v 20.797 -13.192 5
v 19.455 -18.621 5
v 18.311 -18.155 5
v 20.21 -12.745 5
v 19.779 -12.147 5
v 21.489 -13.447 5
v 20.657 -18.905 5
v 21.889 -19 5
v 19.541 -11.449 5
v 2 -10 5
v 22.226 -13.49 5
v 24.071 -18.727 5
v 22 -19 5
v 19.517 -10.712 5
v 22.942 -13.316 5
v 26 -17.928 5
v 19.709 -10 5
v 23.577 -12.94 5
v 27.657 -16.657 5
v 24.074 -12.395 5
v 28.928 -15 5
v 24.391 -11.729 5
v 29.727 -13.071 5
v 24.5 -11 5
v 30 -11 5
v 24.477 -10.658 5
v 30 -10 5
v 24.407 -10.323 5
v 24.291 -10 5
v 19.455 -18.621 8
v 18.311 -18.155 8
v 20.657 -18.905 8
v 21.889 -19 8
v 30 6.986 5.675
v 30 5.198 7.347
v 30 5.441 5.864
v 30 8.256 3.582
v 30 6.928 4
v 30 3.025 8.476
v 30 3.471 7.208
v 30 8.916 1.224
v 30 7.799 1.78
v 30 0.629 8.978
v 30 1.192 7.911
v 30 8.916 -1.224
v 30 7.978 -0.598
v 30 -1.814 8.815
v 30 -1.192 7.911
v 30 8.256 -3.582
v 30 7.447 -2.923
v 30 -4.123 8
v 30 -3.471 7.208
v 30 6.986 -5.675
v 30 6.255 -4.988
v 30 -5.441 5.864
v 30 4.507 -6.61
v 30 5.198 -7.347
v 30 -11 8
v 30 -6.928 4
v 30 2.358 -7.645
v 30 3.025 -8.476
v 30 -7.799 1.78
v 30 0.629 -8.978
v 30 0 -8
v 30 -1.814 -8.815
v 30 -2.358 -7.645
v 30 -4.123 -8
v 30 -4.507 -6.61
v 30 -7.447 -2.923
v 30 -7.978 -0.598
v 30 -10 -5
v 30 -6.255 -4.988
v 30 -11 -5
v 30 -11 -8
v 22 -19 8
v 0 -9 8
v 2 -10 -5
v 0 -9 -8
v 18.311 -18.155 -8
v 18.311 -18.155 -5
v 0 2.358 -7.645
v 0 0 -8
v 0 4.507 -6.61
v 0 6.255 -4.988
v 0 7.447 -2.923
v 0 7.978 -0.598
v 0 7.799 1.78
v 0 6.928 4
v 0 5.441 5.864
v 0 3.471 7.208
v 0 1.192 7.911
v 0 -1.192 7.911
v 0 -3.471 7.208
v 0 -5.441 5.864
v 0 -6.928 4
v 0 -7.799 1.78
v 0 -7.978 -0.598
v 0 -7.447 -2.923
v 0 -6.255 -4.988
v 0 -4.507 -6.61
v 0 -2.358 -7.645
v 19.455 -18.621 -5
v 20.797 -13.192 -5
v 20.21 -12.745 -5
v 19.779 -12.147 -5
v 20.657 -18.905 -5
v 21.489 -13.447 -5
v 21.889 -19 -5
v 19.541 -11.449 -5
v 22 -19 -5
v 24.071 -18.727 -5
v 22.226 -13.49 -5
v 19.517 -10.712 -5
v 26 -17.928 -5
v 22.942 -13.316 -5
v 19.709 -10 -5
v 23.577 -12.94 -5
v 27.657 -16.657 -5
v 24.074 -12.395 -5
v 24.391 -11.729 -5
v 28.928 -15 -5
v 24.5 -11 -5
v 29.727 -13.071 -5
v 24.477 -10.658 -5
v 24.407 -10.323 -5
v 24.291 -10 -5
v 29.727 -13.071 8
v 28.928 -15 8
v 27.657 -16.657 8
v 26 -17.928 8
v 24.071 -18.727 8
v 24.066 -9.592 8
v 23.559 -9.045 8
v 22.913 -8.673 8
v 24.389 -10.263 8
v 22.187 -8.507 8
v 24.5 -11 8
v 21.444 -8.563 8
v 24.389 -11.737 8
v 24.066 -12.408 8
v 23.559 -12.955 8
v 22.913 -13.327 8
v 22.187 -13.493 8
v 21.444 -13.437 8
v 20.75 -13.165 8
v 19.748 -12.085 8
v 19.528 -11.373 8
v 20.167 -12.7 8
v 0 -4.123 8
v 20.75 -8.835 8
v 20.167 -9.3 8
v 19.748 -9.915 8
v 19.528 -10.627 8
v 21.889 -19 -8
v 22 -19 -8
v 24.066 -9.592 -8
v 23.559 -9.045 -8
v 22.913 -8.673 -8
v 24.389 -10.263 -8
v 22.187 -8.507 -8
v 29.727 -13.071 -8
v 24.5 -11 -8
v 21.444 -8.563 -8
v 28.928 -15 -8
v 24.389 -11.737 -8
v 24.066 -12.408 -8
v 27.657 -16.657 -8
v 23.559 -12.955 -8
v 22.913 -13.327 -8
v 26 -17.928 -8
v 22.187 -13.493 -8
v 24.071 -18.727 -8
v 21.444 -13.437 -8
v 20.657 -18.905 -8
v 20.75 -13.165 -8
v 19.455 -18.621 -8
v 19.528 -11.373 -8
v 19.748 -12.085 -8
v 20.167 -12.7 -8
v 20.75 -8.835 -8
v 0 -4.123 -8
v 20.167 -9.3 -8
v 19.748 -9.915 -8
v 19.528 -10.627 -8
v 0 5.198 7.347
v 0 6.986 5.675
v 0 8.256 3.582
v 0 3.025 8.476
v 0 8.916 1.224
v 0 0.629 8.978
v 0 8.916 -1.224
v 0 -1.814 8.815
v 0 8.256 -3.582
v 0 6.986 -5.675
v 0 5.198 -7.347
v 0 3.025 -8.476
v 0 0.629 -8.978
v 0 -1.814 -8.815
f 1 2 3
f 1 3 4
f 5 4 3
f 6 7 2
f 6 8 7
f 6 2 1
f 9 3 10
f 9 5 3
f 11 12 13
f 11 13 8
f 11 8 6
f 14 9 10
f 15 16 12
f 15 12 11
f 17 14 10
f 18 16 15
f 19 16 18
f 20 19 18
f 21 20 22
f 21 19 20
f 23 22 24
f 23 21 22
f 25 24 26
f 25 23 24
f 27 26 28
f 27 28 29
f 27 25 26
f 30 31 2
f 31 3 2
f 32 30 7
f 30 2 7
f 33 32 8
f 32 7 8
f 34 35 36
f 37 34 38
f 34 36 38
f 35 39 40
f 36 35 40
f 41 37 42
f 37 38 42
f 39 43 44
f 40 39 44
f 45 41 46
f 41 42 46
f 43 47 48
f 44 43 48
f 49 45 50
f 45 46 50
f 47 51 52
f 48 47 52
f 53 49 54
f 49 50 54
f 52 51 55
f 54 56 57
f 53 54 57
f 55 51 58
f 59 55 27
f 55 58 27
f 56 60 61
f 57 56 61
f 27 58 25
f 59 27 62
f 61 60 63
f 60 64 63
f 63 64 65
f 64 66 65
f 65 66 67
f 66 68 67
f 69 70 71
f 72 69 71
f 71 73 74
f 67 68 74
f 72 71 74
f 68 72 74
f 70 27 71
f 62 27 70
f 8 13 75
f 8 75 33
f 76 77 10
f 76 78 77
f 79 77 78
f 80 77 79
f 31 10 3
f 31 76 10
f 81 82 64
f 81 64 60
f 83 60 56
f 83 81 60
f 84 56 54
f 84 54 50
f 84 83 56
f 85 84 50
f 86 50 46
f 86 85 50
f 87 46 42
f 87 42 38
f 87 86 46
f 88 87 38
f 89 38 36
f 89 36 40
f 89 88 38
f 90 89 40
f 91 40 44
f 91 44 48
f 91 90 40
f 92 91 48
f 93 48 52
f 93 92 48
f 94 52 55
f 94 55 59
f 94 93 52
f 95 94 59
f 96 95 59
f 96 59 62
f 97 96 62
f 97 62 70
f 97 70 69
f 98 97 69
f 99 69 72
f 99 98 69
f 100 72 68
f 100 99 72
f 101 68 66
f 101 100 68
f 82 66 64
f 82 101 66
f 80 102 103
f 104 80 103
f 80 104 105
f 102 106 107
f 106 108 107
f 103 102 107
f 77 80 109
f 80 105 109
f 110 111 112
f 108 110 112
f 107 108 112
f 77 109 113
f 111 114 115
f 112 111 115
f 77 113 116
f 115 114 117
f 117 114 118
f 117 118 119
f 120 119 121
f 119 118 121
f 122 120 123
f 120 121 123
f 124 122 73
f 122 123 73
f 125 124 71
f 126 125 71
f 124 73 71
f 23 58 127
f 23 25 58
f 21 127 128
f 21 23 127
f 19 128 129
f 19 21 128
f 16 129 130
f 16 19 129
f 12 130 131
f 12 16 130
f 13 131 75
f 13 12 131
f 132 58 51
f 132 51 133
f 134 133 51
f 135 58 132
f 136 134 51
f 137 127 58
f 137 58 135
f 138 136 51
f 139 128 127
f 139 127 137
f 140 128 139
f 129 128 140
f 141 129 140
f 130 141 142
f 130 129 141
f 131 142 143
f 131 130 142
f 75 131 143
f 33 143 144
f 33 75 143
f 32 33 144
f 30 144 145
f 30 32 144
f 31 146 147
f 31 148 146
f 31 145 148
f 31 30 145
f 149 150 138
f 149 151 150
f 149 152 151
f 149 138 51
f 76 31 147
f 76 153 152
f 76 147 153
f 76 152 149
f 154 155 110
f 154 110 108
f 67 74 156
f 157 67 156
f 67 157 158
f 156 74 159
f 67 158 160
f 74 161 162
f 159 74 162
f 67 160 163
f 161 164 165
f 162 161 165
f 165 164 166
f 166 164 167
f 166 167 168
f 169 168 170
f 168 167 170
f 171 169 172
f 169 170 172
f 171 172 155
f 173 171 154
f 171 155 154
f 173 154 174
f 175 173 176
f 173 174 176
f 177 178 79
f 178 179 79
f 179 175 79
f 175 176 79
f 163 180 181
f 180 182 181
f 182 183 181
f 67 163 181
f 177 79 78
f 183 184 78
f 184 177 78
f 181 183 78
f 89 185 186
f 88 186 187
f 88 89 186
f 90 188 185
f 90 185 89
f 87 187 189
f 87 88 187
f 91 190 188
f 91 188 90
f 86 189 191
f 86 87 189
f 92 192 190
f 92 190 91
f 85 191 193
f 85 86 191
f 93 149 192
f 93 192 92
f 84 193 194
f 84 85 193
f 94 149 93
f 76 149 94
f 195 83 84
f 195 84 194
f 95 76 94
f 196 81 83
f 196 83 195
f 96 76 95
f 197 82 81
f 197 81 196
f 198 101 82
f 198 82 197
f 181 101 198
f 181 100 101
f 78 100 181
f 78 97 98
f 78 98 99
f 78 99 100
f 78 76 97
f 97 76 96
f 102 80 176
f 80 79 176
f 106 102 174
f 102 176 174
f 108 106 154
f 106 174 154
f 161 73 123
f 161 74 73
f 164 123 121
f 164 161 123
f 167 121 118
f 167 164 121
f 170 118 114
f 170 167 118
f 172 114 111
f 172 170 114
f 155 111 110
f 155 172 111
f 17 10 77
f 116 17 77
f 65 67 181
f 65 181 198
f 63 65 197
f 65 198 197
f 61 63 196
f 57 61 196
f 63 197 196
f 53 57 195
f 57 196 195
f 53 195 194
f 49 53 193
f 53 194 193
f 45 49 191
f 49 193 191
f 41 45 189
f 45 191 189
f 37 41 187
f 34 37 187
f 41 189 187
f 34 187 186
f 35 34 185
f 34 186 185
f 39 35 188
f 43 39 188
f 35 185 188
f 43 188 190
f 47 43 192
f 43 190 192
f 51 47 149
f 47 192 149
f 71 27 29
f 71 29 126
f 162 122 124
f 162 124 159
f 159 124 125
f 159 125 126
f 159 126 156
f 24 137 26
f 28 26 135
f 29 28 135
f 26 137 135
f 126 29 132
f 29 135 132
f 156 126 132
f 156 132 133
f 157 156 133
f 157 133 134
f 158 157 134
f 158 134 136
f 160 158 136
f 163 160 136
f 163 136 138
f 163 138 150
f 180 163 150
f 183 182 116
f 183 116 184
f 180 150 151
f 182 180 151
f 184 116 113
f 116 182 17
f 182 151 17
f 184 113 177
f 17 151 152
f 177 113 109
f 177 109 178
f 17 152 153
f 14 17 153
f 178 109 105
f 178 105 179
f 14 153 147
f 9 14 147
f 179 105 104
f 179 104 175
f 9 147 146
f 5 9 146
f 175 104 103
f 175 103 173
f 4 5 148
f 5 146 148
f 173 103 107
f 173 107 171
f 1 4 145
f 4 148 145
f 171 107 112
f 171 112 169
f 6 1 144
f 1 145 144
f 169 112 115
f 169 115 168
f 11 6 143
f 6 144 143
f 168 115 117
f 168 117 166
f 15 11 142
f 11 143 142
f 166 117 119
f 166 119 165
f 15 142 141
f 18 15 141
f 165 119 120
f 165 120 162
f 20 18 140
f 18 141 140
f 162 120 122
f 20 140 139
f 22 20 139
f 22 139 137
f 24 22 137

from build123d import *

# Parameters (mm, degrees)
SKETCH1_R                       = 9
SKETCH1_R_2                     = 8
BOSS_EXTRUDE1_DEPTH             = 30
SKETCH2_W                       = 30
SKETCH2_H                       = 16
BOSS_EXTRUDE2_DEPTH             = 10
BOSS_EXTRUDE2_DIRECTION_2_REACH = 38.125
CUT_EXTRUDE1_DEPTH              = 40.37003937
SKETCH4_W                       = 10
SKETCH4_H                       = 9
CUT_EXTRUDE2_DEPTH              = 37.633318168
FILLET1_R                       = 8
SKETCH5_R                       = 2.5
CUT_EXTRUDE3_DEPTH              = 40.37003937


with BuildPart() as part:
    # Sketch1 → Boss-Extrude1 (new body)
    with BuildSketch(Plane(origin=(0, 0, 0), x_dir=(0, 0, -1), z_dir=(1, 0, 0))):
        Circle(SKETCH1_R)
        Circle(SKETCH1_R_2, mode=Mode.SUBTRACT)
    extrude(amount=BOSS_EXTRUDE1_DEPTH)

    # Sketch2 → Boss-Extrude2 (add)
    with BuildSketch(Plane(origin=(0, -9, 0), x_dir=(-1, 0, 0), z_dir=(0, -1, 0))):
        with Locations((-15, 0)):
            Rectangle(SKETCH2_W, SKETCH2_H)
    extrude(amount=BOSS_EXTRUDE2_DEPTH)

    # Sketch2 → Boss-Extrude2 direction 2 (add, up to next)
    with BuildSketch(Plane(origin=(0, -9, 0), x_dir=(-1, 0, 0), z_dir=(0, -1, 0)), mode=Mode.PRIVATE) as boss_extrude2_direction_2_sk1:
        with Locations((-15, 0)):
            Rectangle(SKETCH2_W, SKETCH2_H)
    boss_extrude2_direction_2_tool1 = extrude(boss_extrude2_direction_2_sk1.sketch, amount=-BOSS_EXTRUDE2_DIRECTION_2_REACH, mode=Mode.PRIVATE) - part.part
    add(boss_extrude2_direction_2_tool1.solids().sort_by_distance((15, -9, 0))[0])
    add(boss_extrude2_direction_2_tool1.solids().sort_by_distance((15, -9, 0))[1])

    # Sketch3 → Cut-Extrude1 (cut, through all)
    with BuildSketch(Plane.XY.offset(8)):
        Polygon((0, -19), (0, -9), (20, -19), align=None)
    extrude(amount=-CUT_EXTRUDE1_DEPTH, mode=Mode.SUBTRACT)

    # Sketch4 → Cut-Extrude2 (cut, through all)
    with BuildSketch(Plane(origin=(30, 0, 0), x_dir=(0, 0, -1), z_dir=(1, 0, 0))):
        with Locations((0, -14.5)):
            Rectangle(SKETCH4_W, SKETCH4_H)
    extrude(amount=-CUT_EXTRUDE2_DEPTH, mode=Mode.SUBTRACT)

    # Fillet1
    fillet1_edges = [part.edges().sort_by_distance(p)[0] for p in [
        (30, -19, -6.5),
        (20, -19, -6.5),
        (20, -19, 6.5),
        (30, -19, 6.5),
    ]]
    fillet(fillet1_edges, radius=FILLET1_R)

    # Sketch5 → Cut-Extrude3 (cut, through all)
    with BuildSketch(Plane.XY.offset(8)):
        with Locations((22, -11)):
            Circle(SKETCH5_R)
    extrude(amount=-CUT_EXTRUDE3_DEPTH, mode=Mode.SUBTRACT)


solid = part.part
